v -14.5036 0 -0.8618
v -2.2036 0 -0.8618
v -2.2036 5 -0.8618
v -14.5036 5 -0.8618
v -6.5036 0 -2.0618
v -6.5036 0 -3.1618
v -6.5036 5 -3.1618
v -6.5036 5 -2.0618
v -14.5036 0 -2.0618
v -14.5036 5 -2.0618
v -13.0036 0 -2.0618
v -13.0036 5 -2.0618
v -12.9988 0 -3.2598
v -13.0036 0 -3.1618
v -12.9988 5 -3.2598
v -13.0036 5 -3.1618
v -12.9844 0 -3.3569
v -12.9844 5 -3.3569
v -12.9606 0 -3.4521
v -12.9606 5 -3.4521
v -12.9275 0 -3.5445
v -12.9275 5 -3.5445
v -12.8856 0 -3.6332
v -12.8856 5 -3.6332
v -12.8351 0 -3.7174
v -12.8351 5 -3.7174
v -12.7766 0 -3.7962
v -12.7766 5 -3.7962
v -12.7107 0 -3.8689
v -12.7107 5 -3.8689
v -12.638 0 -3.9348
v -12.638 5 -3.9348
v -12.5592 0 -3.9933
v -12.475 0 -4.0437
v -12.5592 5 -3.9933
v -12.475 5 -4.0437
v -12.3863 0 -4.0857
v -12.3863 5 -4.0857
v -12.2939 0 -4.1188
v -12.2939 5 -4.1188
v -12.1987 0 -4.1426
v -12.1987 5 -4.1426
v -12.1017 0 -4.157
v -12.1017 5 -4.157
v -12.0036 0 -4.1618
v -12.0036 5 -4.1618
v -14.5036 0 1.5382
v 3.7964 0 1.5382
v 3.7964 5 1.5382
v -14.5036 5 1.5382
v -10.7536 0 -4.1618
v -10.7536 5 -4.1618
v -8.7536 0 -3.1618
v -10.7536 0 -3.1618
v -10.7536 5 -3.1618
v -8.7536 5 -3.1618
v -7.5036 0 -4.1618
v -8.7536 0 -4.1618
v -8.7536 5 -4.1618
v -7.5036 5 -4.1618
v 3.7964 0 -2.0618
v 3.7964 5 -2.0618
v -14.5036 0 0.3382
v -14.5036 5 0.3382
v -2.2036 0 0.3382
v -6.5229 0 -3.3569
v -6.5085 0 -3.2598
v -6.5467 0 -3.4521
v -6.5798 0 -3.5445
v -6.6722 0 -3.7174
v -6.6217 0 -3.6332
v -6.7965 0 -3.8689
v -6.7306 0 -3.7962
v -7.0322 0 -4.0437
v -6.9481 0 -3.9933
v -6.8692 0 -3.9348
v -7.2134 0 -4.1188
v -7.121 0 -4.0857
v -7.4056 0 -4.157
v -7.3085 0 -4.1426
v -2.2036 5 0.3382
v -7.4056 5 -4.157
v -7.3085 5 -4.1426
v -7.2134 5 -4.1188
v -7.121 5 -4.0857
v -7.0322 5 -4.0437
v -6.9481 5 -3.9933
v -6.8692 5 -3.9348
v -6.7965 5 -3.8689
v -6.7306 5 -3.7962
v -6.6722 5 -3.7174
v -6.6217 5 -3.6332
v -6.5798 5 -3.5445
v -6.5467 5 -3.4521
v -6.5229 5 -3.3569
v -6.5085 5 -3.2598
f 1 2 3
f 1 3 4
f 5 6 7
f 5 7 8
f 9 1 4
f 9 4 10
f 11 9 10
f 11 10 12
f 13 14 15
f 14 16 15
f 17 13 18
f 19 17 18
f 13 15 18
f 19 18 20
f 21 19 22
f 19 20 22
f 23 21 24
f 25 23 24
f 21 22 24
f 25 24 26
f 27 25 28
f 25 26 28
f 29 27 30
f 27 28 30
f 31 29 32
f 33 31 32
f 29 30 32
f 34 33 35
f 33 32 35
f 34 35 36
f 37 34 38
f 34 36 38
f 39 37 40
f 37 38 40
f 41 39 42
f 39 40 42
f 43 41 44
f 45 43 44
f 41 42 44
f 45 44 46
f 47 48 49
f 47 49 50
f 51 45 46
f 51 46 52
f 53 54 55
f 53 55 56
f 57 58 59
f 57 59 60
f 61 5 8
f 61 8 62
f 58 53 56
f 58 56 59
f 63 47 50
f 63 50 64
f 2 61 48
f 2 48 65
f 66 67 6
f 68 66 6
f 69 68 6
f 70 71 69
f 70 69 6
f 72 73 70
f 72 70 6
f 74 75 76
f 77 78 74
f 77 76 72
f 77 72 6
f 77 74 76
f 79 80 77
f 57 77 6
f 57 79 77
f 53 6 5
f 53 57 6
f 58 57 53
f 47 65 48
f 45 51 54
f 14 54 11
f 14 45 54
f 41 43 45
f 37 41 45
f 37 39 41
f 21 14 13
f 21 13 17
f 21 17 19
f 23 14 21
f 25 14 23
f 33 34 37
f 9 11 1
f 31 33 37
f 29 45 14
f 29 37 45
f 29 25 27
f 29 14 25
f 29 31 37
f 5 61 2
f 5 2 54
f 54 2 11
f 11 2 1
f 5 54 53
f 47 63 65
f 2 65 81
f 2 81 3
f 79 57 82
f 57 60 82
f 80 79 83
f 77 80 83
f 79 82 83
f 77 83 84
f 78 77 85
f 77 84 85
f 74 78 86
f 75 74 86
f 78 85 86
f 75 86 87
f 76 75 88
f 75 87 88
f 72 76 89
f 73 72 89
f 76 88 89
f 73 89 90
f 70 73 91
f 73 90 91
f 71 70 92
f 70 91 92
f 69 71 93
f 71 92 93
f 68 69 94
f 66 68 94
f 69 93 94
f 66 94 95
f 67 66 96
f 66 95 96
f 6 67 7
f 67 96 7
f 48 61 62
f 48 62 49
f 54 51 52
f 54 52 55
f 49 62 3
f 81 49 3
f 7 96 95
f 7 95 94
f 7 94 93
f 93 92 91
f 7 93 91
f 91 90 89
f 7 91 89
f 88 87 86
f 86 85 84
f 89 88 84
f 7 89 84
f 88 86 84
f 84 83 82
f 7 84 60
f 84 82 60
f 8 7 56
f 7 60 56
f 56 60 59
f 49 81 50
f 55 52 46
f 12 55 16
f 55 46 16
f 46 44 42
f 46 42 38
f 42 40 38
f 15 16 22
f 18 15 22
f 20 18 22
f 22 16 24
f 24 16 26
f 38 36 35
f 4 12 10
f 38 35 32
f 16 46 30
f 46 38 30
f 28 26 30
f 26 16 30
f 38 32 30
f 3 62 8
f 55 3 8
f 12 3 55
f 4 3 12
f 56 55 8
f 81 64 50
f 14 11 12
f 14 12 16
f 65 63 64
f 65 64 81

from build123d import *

# Parameters (mm, degrees)
BOSS_EXTRUDE1_DEPTH = 5
FILLET1_R           = 1


with BuildPart() as part:
    # Sketch1 → Boss-Extrude1 (new body)
    with BuildSketch(Plane(origin=(0, 0, 0), x_dir=(1, 0, 0), z_dir=(0, 1, 0))):
        Polygon((-8.753636364, 4.161818182), (-6.503636364, 4.161818182), (-6.503636364, 2.061818182), (3.796363636, 2.061818182), (3.796363636, -1.538181818), (-14.503636364, -1.538181818), (-14.503636364, -0.338181818), (-2.203636364, -0.338181818), (-2.203636364, 0.861818182), (-14.503636364, 0.861818182), (-14.503636364, 2.061818182), (-13.003636364, 2.061818182), (-13.003636364, 4.161818182), (-10.753636364, 4.161818182), (-10.753636364, 3.161818182), (-8.753636364, 3.161818182), align=None)
    extrude(amount=BOSS_EXTRUDE1_DEPTH)

    # Fillet1
    fillet1_edges = [part.edges().sort_by_distance(p)[0] for p in [
        (-13.003636364, 2.5, -4.161818182),
        (-6.503636364, 2.5, -4.161818182),
    ]]
    fillet(fillet1_edges, radius=FILLET1_R)


solid = part.part
